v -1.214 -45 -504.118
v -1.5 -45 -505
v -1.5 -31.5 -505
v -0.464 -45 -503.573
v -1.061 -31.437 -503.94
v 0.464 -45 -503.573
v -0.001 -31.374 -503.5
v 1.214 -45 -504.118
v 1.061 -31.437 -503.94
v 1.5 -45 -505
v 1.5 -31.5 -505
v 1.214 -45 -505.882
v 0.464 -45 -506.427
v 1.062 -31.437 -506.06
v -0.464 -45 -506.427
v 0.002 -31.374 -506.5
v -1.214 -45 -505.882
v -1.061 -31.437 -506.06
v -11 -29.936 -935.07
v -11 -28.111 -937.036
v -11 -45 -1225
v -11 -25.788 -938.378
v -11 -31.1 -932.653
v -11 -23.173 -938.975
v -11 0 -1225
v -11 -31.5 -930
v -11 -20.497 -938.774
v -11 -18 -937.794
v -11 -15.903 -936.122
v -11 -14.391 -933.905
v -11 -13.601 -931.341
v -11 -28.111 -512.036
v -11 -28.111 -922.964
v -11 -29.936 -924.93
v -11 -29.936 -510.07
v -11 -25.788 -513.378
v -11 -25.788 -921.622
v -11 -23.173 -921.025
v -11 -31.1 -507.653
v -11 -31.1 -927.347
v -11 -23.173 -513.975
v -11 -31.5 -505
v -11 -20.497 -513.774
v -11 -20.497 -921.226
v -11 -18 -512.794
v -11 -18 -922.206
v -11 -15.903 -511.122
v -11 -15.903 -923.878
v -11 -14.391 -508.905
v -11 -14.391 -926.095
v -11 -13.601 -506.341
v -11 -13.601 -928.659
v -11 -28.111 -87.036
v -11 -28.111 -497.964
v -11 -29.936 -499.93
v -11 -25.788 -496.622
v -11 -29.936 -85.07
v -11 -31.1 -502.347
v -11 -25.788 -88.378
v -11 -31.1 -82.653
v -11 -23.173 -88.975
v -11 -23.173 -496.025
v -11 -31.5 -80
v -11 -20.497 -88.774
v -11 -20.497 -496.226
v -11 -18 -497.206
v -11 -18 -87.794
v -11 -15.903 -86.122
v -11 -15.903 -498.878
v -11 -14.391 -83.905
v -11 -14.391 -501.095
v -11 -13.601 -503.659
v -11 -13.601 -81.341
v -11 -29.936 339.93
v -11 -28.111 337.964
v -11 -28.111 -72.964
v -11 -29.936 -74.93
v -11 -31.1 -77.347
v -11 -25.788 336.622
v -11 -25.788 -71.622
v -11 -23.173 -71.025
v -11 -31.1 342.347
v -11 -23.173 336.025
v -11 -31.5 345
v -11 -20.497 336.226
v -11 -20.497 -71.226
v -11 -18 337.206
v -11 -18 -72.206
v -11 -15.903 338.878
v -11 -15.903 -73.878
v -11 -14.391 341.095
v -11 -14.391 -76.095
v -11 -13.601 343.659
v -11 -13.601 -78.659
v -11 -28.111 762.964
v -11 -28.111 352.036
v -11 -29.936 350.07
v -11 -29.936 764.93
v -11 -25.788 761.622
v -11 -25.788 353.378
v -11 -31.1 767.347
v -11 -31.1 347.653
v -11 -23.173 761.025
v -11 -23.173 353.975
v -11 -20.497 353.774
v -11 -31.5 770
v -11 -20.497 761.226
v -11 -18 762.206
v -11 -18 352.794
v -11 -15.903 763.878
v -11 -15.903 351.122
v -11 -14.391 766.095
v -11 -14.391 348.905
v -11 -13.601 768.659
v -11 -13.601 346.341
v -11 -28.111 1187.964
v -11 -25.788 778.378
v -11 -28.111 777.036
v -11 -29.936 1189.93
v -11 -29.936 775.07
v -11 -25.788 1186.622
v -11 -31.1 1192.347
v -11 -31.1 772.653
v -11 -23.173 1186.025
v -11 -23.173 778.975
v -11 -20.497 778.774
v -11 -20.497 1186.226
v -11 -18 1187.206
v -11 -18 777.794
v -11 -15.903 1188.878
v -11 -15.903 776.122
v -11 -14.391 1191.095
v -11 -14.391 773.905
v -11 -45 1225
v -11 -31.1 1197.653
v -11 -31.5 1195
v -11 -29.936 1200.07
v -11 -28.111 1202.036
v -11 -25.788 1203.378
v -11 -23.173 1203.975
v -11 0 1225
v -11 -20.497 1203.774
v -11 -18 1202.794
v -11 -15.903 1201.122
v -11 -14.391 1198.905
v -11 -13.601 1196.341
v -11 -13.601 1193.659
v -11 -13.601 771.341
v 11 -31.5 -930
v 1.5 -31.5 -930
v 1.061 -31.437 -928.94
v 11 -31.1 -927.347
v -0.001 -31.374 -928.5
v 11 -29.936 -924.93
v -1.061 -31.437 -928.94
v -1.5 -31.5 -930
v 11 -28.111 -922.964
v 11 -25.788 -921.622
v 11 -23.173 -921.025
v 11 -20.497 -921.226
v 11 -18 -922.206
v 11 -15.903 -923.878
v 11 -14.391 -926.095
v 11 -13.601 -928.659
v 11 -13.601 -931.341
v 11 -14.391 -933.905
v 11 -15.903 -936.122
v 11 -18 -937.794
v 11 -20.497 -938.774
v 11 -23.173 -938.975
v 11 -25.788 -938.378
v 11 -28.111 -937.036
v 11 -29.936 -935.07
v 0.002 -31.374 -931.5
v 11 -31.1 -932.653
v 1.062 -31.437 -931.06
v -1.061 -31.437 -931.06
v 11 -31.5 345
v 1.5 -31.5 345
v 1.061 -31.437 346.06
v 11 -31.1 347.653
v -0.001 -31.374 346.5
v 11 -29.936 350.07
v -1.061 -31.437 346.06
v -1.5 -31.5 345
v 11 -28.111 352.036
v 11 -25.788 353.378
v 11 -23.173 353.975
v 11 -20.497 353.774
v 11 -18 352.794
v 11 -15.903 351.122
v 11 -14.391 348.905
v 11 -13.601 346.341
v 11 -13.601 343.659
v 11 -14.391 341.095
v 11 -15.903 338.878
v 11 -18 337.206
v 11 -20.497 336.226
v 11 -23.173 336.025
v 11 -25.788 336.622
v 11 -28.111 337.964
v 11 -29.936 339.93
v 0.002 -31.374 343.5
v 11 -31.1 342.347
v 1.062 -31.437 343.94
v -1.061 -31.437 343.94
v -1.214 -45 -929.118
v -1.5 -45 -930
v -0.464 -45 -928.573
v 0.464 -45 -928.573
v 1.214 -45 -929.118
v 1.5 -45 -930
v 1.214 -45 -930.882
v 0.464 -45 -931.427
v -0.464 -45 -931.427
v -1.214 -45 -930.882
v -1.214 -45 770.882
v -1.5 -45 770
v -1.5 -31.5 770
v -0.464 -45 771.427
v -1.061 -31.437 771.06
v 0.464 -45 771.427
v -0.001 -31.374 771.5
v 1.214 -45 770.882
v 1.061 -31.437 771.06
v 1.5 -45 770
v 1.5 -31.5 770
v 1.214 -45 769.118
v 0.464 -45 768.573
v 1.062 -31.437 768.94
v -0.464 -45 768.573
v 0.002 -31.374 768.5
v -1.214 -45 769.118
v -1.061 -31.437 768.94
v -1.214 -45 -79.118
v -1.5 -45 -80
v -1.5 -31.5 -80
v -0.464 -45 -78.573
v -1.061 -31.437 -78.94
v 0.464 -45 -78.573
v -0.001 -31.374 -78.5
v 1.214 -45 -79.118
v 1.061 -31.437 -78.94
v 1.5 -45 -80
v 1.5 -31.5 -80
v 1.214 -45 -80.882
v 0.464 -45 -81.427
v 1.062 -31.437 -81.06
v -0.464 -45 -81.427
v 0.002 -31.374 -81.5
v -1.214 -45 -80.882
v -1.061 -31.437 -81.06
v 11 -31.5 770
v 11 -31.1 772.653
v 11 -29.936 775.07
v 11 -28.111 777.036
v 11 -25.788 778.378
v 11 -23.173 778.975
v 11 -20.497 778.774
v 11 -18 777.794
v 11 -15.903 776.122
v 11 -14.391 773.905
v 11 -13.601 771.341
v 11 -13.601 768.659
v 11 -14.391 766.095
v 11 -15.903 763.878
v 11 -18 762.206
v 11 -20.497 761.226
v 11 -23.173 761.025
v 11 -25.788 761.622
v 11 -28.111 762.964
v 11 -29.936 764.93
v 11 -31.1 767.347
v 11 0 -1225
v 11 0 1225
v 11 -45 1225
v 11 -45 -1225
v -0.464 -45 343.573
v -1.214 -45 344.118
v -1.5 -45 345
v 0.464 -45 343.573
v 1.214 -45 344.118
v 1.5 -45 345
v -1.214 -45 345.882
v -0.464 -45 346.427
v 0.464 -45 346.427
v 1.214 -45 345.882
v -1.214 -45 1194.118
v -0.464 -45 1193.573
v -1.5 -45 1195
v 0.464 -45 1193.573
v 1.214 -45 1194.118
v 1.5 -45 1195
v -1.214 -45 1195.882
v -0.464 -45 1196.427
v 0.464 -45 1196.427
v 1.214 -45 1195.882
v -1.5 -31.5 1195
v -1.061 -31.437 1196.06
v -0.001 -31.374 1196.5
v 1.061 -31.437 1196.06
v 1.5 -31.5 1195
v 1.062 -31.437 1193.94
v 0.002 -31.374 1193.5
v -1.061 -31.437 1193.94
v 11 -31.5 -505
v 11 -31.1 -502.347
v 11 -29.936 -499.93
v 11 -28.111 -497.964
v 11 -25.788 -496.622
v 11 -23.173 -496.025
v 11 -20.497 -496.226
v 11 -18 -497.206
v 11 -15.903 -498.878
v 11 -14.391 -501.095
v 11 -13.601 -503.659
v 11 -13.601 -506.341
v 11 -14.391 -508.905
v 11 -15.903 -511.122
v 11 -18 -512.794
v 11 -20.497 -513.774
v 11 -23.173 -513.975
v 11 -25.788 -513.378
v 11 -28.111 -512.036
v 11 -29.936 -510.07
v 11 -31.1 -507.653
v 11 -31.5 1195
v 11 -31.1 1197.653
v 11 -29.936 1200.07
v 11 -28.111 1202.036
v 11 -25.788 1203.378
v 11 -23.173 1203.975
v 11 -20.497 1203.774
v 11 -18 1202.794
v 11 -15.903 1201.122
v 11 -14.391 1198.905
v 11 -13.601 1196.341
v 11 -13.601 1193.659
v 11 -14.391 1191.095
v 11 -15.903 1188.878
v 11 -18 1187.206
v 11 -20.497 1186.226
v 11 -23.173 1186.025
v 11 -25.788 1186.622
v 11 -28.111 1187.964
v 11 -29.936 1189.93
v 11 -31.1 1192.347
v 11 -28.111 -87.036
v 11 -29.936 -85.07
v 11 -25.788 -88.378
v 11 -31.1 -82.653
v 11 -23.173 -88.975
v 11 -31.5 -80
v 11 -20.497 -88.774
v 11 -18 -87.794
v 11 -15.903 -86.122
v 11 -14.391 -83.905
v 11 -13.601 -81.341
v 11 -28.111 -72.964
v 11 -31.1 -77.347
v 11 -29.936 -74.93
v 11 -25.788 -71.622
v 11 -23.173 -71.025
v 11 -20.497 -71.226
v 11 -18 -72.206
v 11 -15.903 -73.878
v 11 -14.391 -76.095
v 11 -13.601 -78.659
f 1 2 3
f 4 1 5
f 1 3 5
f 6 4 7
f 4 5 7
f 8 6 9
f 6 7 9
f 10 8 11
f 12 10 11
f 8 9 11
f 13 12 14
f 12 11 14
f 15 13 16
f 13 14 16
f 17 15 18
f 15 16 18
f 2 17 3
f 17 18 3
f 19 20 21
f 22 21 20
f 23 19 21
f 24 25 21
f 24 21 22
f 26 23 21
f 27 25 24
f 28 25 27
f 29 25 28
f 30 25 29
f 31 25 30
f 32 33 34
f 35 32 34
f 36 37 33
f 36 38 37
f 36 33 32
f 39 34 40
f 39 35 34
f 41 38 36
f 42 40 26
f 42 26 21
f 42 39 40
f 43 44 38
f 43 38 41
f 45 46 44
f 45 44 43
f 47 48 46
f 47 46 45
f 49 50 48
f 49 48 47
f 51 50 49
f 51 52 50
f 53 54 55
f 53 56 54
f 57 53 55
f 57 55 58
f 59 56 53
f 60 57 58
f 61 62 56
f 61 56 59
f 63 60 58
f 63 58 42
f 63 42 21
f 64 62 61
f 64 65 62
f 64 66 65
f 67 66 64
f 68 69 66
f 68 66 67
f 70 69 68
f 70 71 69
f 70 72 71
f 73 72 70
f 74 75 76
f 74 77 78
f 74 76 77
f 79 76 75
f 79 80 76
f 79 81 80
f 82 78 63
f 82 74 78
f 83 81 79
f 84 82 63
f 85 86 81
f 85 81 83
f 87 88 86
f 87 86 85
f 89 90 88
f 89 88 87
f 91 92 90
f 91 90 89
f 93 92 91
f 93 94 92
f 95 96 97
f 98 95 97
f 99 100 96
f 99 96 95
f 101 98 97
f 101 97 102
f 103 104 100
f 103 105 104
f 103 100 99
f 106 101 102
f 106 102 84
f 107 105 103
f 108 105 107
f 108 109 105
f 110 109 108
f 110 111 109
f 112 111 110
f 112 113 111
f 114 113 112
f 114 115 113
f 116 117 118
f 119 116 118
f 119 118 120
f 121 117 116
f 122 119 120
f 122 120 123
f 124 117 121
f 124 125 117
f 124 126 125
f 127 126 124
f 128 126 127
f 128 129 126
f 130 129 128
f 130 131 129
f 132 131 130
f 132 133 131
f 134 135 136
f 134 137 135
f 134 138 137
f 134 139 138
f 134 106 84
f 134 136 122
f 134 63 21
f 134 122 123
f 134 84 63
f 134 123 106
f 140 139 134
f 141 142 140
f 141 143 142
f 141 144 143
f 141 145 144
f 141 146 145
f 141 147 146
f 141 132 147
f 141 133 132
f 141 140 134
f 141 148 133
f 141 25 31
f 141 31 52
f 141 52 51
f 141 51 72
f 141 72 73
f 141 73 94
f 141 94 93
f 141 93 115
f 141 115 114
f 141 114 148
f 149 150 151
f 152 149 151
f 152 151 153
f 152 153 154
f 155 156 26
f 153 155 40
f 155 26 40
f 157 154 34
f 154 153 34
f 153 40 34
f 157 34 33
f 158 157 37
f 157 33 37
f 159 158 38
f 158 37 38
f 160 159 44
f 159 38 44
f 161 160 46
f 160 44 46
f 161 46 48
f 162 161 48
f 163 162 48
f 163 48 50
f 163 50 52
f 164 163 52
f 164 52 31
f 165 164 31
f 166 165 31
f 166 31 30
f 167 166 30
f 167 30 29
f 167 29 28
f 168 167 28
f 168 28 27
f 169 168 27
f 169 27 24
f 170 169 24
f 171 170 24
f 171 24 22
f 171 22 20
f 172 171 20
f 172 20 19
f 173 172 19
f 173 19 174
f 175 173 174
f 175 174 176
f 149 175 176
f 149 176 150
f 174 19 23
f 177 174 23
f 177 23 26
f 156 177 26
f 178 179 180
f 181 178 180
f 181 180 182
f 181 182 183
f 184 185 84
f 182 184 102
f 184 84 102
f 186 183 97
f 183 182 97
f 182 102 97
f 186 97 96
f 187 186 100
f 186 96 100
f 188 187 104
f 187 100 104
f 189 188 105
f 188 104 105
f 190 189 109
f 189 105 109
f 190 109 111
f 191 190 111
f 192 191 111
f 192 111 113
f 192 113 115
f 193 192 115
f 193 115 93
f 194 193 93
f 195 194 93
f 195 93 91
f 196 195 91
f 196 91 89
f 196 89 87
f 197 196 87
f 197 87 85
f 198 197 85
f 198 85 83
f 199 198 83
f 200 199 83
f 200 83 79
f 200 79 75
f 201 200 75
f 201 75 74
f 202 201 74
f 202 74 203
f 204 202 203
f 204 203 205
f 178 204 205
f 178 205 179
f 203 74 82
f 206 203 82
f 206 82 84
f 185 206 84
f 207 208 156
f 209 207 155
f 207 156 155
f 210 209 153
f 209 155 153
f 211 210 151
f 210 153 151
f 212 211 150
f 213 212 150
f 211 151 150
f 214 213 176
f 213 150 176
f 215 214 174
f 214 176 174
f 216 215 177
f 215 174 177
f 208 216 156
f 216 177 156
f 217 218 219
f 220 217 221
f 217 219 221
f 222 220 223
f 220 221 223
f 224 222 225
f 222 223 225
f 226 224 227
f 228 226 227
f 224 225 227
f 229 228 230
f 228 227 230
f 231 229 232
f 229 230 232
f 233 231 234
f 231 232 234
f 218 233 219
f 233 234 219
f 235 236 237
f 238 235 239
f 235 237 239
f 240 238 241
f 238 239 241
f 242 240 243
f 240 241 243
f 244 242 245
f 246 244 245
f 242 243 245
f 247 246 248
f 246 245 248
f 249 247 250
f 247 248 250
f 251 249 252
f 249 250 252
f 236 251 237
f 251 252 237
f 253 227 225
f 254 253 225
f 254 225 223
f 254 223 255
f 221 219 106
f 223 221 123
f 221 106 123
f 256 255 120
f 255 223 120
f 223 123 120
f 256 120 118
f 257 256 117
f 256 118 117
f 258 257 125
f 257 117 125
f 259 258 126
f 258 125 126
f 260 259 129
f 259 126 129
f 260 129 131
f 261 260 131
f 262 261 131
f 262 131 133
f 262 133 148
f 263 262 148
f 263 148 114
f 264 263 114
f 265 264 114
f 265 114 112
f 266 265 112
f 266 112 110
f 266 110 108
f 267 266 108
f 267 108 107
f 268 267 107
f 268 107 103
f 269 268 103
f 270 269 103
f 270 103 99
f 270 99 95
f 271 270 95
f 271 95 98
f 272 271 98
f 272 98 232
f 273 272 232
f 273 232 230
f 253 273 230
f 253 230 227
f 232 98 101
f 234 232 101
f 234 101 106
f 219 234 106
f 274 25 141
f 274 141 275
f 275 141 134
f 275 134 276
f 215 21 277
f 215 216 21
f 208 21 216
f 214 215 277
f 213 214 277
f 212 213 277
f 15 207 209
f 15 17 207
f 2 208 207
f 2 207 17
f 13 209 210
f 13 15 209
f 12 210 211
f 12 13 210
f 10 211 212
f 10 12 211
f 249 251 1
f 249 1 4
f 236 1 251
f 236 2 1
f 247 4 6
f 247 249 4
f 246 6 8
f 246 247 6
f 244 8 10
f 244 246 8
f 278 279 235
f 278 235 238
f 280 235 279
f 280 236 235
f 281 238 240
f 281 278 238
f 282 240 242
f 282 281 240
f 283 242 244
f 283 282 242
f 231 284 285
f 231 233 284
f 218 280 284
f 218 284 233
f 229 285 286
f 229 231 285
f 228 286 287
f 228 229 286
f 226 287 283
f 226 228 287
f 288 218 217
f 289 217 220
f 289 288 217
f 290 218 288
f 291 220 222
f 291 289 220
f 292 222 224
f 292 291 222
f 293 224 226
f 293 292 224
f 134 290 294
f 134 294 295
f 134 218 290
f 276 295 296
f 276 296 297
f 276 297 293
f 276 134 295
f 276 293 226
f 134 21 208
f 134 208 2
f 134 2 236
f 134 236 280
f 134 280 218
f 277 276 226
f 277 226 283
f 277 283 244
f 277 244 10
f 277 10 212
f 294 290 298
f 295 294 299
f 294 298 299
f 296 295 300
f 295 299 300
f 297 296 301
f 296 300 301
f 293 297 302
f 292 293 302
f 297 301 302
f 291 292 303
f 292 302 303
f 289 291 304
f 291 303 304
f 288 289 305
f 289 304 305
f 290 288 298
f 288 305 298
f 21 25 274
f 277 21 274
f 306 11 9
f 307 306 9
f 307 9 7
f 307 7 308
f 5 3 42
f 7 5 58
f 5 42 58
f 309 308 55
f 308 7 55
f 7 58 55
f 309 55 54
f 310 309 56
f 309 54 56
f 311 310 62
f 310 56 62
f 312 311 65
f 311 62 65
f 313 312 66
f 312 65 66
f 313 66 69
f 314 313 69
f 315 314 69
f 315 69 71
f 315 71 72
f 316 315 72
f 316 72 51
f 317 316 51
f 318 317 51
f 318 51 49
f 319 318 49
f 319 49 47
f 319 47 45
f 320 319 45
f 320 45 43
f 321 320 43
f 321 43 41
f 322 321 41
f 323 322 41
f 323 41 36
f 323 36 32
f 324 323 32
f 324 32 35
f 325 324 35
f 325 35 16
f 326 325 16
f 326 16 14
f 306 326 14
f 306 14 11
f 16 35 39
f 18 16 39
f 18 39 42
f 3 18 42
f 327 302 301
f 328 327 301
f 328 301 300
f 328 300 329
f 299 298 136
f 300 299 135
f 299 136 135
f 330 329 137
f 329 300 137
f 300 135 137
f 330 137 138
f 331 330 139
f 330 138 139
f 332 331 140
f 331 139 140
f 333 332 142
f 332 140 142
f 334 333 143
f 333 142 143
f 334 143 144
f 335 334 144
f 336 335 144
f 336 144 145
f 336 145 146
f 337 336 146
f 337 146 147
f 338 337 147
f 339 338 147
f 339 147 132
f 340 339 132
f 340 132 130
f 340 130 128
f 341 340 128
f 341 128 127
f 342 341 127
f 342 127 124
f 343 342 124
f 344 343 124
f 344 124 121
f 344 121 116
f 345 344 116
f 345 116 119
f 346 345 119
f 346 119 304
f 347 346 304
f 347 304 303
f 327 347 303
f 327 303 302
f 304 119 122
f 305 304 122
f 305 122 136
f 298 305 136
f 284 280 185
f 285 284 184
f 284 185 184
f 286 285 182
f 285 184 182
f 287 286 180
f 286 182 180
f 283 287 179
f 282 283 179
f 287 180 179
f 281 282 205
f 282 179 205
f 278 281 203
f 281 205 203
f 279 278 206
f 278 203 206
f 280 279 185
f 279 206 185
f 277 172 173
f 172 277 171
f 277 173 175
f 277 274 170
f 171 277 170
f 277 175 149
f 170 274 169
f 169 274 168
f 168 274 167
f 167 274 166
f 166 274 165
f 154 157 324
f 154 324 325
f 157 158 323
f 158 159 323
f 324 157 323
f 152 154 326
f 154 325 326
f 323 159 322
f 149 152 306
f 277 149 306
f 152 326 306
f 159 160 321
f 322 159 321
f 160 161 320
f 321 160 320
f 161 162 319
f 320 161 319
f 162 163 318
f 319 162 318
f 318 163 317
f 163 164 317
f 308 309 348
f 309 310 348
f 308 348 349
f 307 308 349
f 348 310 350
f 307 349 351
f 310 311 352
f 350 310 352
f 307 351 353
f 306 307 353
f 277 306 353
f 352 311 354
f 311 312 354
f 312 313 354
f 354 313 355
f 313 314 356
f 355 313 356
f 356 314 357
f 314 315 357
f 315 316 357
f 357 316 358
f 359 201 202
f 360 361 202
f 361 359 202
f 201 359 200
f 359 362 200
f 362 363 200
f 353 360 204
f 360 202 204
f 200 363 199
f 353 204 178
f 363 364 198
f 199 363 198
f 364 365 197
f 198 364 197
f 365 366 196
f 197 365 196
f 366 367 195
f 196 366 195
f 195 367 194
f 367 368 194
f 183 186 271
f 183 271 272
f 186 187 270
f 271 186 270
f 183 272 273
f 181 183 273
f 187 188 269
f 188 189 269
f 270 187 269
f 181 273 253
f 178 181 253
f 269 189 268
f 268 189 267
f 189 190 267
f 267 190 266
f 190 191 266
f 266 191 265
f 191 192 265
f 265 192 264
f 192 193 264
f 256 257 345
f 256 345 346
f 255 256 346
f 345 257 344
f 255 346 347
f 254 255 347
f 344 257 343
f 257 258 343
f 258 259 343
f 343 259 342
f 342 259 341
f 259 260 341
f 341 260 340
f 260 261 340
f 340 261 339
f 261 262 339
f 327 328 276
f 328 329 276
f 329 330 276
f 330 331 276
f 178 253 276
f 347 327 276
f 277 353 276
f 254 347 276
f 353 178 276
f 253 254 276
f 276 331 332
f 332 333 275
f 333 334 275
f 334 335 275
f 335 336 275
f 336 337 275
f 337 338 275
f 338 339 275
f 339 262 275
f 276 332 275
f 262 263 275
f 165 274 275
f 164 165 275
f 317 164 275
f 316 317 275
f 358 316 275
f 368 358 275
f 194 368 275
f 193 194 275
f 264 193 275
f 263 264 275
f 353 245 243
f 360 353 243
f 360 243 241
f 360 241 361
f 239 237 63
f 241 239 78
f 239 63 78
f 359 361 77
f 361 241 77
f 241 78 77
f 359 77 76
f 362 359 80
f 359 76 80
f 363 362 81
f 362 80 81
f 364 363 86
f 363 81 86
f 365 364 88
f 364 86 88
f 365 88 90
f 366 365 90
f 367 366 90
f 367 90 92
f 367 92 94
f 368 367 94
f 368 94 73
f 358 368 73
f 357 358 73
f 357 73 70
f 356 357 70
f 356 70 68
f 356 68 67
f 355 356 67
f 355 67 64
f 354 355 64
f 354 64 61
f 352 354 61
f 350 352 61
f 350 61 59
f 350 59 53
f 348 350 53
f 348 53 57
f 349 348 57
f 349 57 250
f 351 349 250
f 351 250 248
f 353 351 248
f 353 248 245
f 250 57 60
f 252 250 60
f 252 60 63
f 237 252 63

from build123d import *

# Parameters (mm, degrees)
F0_W     = 22
F0_H     = 2450
F1_DEPTH = 45
F3_D     = 3
F3_DEPTH = 22
F5_D     = 18


with BuildPart() as f1:
    # F0 (on Front) → F1 (new body)
    with BuildSketch(Plane.XZ):
        Rectangle(F0_W, F0_H)
    extrude(amount=F1_DEPTH)

    # F3
    with Locations(Plane.XZ.offset(45)):
        with Locations((0, 1195), (0, 770), (0, -505), (0, 345), (0, -930), (0, -80)):
            Hole(F3_D / 2, depth=F3_DEPTH)

    # F5 (through all)
    with Locations(Plane.YZ.offset(11)):
        with Locations((-22.5, 1195), (-22.5, 770), (-22.5, 345), (-22.5, -80), (-22.5, -505), (-22.5, -930)):
            Hole(F5_D / 2)


solid = f1.part
